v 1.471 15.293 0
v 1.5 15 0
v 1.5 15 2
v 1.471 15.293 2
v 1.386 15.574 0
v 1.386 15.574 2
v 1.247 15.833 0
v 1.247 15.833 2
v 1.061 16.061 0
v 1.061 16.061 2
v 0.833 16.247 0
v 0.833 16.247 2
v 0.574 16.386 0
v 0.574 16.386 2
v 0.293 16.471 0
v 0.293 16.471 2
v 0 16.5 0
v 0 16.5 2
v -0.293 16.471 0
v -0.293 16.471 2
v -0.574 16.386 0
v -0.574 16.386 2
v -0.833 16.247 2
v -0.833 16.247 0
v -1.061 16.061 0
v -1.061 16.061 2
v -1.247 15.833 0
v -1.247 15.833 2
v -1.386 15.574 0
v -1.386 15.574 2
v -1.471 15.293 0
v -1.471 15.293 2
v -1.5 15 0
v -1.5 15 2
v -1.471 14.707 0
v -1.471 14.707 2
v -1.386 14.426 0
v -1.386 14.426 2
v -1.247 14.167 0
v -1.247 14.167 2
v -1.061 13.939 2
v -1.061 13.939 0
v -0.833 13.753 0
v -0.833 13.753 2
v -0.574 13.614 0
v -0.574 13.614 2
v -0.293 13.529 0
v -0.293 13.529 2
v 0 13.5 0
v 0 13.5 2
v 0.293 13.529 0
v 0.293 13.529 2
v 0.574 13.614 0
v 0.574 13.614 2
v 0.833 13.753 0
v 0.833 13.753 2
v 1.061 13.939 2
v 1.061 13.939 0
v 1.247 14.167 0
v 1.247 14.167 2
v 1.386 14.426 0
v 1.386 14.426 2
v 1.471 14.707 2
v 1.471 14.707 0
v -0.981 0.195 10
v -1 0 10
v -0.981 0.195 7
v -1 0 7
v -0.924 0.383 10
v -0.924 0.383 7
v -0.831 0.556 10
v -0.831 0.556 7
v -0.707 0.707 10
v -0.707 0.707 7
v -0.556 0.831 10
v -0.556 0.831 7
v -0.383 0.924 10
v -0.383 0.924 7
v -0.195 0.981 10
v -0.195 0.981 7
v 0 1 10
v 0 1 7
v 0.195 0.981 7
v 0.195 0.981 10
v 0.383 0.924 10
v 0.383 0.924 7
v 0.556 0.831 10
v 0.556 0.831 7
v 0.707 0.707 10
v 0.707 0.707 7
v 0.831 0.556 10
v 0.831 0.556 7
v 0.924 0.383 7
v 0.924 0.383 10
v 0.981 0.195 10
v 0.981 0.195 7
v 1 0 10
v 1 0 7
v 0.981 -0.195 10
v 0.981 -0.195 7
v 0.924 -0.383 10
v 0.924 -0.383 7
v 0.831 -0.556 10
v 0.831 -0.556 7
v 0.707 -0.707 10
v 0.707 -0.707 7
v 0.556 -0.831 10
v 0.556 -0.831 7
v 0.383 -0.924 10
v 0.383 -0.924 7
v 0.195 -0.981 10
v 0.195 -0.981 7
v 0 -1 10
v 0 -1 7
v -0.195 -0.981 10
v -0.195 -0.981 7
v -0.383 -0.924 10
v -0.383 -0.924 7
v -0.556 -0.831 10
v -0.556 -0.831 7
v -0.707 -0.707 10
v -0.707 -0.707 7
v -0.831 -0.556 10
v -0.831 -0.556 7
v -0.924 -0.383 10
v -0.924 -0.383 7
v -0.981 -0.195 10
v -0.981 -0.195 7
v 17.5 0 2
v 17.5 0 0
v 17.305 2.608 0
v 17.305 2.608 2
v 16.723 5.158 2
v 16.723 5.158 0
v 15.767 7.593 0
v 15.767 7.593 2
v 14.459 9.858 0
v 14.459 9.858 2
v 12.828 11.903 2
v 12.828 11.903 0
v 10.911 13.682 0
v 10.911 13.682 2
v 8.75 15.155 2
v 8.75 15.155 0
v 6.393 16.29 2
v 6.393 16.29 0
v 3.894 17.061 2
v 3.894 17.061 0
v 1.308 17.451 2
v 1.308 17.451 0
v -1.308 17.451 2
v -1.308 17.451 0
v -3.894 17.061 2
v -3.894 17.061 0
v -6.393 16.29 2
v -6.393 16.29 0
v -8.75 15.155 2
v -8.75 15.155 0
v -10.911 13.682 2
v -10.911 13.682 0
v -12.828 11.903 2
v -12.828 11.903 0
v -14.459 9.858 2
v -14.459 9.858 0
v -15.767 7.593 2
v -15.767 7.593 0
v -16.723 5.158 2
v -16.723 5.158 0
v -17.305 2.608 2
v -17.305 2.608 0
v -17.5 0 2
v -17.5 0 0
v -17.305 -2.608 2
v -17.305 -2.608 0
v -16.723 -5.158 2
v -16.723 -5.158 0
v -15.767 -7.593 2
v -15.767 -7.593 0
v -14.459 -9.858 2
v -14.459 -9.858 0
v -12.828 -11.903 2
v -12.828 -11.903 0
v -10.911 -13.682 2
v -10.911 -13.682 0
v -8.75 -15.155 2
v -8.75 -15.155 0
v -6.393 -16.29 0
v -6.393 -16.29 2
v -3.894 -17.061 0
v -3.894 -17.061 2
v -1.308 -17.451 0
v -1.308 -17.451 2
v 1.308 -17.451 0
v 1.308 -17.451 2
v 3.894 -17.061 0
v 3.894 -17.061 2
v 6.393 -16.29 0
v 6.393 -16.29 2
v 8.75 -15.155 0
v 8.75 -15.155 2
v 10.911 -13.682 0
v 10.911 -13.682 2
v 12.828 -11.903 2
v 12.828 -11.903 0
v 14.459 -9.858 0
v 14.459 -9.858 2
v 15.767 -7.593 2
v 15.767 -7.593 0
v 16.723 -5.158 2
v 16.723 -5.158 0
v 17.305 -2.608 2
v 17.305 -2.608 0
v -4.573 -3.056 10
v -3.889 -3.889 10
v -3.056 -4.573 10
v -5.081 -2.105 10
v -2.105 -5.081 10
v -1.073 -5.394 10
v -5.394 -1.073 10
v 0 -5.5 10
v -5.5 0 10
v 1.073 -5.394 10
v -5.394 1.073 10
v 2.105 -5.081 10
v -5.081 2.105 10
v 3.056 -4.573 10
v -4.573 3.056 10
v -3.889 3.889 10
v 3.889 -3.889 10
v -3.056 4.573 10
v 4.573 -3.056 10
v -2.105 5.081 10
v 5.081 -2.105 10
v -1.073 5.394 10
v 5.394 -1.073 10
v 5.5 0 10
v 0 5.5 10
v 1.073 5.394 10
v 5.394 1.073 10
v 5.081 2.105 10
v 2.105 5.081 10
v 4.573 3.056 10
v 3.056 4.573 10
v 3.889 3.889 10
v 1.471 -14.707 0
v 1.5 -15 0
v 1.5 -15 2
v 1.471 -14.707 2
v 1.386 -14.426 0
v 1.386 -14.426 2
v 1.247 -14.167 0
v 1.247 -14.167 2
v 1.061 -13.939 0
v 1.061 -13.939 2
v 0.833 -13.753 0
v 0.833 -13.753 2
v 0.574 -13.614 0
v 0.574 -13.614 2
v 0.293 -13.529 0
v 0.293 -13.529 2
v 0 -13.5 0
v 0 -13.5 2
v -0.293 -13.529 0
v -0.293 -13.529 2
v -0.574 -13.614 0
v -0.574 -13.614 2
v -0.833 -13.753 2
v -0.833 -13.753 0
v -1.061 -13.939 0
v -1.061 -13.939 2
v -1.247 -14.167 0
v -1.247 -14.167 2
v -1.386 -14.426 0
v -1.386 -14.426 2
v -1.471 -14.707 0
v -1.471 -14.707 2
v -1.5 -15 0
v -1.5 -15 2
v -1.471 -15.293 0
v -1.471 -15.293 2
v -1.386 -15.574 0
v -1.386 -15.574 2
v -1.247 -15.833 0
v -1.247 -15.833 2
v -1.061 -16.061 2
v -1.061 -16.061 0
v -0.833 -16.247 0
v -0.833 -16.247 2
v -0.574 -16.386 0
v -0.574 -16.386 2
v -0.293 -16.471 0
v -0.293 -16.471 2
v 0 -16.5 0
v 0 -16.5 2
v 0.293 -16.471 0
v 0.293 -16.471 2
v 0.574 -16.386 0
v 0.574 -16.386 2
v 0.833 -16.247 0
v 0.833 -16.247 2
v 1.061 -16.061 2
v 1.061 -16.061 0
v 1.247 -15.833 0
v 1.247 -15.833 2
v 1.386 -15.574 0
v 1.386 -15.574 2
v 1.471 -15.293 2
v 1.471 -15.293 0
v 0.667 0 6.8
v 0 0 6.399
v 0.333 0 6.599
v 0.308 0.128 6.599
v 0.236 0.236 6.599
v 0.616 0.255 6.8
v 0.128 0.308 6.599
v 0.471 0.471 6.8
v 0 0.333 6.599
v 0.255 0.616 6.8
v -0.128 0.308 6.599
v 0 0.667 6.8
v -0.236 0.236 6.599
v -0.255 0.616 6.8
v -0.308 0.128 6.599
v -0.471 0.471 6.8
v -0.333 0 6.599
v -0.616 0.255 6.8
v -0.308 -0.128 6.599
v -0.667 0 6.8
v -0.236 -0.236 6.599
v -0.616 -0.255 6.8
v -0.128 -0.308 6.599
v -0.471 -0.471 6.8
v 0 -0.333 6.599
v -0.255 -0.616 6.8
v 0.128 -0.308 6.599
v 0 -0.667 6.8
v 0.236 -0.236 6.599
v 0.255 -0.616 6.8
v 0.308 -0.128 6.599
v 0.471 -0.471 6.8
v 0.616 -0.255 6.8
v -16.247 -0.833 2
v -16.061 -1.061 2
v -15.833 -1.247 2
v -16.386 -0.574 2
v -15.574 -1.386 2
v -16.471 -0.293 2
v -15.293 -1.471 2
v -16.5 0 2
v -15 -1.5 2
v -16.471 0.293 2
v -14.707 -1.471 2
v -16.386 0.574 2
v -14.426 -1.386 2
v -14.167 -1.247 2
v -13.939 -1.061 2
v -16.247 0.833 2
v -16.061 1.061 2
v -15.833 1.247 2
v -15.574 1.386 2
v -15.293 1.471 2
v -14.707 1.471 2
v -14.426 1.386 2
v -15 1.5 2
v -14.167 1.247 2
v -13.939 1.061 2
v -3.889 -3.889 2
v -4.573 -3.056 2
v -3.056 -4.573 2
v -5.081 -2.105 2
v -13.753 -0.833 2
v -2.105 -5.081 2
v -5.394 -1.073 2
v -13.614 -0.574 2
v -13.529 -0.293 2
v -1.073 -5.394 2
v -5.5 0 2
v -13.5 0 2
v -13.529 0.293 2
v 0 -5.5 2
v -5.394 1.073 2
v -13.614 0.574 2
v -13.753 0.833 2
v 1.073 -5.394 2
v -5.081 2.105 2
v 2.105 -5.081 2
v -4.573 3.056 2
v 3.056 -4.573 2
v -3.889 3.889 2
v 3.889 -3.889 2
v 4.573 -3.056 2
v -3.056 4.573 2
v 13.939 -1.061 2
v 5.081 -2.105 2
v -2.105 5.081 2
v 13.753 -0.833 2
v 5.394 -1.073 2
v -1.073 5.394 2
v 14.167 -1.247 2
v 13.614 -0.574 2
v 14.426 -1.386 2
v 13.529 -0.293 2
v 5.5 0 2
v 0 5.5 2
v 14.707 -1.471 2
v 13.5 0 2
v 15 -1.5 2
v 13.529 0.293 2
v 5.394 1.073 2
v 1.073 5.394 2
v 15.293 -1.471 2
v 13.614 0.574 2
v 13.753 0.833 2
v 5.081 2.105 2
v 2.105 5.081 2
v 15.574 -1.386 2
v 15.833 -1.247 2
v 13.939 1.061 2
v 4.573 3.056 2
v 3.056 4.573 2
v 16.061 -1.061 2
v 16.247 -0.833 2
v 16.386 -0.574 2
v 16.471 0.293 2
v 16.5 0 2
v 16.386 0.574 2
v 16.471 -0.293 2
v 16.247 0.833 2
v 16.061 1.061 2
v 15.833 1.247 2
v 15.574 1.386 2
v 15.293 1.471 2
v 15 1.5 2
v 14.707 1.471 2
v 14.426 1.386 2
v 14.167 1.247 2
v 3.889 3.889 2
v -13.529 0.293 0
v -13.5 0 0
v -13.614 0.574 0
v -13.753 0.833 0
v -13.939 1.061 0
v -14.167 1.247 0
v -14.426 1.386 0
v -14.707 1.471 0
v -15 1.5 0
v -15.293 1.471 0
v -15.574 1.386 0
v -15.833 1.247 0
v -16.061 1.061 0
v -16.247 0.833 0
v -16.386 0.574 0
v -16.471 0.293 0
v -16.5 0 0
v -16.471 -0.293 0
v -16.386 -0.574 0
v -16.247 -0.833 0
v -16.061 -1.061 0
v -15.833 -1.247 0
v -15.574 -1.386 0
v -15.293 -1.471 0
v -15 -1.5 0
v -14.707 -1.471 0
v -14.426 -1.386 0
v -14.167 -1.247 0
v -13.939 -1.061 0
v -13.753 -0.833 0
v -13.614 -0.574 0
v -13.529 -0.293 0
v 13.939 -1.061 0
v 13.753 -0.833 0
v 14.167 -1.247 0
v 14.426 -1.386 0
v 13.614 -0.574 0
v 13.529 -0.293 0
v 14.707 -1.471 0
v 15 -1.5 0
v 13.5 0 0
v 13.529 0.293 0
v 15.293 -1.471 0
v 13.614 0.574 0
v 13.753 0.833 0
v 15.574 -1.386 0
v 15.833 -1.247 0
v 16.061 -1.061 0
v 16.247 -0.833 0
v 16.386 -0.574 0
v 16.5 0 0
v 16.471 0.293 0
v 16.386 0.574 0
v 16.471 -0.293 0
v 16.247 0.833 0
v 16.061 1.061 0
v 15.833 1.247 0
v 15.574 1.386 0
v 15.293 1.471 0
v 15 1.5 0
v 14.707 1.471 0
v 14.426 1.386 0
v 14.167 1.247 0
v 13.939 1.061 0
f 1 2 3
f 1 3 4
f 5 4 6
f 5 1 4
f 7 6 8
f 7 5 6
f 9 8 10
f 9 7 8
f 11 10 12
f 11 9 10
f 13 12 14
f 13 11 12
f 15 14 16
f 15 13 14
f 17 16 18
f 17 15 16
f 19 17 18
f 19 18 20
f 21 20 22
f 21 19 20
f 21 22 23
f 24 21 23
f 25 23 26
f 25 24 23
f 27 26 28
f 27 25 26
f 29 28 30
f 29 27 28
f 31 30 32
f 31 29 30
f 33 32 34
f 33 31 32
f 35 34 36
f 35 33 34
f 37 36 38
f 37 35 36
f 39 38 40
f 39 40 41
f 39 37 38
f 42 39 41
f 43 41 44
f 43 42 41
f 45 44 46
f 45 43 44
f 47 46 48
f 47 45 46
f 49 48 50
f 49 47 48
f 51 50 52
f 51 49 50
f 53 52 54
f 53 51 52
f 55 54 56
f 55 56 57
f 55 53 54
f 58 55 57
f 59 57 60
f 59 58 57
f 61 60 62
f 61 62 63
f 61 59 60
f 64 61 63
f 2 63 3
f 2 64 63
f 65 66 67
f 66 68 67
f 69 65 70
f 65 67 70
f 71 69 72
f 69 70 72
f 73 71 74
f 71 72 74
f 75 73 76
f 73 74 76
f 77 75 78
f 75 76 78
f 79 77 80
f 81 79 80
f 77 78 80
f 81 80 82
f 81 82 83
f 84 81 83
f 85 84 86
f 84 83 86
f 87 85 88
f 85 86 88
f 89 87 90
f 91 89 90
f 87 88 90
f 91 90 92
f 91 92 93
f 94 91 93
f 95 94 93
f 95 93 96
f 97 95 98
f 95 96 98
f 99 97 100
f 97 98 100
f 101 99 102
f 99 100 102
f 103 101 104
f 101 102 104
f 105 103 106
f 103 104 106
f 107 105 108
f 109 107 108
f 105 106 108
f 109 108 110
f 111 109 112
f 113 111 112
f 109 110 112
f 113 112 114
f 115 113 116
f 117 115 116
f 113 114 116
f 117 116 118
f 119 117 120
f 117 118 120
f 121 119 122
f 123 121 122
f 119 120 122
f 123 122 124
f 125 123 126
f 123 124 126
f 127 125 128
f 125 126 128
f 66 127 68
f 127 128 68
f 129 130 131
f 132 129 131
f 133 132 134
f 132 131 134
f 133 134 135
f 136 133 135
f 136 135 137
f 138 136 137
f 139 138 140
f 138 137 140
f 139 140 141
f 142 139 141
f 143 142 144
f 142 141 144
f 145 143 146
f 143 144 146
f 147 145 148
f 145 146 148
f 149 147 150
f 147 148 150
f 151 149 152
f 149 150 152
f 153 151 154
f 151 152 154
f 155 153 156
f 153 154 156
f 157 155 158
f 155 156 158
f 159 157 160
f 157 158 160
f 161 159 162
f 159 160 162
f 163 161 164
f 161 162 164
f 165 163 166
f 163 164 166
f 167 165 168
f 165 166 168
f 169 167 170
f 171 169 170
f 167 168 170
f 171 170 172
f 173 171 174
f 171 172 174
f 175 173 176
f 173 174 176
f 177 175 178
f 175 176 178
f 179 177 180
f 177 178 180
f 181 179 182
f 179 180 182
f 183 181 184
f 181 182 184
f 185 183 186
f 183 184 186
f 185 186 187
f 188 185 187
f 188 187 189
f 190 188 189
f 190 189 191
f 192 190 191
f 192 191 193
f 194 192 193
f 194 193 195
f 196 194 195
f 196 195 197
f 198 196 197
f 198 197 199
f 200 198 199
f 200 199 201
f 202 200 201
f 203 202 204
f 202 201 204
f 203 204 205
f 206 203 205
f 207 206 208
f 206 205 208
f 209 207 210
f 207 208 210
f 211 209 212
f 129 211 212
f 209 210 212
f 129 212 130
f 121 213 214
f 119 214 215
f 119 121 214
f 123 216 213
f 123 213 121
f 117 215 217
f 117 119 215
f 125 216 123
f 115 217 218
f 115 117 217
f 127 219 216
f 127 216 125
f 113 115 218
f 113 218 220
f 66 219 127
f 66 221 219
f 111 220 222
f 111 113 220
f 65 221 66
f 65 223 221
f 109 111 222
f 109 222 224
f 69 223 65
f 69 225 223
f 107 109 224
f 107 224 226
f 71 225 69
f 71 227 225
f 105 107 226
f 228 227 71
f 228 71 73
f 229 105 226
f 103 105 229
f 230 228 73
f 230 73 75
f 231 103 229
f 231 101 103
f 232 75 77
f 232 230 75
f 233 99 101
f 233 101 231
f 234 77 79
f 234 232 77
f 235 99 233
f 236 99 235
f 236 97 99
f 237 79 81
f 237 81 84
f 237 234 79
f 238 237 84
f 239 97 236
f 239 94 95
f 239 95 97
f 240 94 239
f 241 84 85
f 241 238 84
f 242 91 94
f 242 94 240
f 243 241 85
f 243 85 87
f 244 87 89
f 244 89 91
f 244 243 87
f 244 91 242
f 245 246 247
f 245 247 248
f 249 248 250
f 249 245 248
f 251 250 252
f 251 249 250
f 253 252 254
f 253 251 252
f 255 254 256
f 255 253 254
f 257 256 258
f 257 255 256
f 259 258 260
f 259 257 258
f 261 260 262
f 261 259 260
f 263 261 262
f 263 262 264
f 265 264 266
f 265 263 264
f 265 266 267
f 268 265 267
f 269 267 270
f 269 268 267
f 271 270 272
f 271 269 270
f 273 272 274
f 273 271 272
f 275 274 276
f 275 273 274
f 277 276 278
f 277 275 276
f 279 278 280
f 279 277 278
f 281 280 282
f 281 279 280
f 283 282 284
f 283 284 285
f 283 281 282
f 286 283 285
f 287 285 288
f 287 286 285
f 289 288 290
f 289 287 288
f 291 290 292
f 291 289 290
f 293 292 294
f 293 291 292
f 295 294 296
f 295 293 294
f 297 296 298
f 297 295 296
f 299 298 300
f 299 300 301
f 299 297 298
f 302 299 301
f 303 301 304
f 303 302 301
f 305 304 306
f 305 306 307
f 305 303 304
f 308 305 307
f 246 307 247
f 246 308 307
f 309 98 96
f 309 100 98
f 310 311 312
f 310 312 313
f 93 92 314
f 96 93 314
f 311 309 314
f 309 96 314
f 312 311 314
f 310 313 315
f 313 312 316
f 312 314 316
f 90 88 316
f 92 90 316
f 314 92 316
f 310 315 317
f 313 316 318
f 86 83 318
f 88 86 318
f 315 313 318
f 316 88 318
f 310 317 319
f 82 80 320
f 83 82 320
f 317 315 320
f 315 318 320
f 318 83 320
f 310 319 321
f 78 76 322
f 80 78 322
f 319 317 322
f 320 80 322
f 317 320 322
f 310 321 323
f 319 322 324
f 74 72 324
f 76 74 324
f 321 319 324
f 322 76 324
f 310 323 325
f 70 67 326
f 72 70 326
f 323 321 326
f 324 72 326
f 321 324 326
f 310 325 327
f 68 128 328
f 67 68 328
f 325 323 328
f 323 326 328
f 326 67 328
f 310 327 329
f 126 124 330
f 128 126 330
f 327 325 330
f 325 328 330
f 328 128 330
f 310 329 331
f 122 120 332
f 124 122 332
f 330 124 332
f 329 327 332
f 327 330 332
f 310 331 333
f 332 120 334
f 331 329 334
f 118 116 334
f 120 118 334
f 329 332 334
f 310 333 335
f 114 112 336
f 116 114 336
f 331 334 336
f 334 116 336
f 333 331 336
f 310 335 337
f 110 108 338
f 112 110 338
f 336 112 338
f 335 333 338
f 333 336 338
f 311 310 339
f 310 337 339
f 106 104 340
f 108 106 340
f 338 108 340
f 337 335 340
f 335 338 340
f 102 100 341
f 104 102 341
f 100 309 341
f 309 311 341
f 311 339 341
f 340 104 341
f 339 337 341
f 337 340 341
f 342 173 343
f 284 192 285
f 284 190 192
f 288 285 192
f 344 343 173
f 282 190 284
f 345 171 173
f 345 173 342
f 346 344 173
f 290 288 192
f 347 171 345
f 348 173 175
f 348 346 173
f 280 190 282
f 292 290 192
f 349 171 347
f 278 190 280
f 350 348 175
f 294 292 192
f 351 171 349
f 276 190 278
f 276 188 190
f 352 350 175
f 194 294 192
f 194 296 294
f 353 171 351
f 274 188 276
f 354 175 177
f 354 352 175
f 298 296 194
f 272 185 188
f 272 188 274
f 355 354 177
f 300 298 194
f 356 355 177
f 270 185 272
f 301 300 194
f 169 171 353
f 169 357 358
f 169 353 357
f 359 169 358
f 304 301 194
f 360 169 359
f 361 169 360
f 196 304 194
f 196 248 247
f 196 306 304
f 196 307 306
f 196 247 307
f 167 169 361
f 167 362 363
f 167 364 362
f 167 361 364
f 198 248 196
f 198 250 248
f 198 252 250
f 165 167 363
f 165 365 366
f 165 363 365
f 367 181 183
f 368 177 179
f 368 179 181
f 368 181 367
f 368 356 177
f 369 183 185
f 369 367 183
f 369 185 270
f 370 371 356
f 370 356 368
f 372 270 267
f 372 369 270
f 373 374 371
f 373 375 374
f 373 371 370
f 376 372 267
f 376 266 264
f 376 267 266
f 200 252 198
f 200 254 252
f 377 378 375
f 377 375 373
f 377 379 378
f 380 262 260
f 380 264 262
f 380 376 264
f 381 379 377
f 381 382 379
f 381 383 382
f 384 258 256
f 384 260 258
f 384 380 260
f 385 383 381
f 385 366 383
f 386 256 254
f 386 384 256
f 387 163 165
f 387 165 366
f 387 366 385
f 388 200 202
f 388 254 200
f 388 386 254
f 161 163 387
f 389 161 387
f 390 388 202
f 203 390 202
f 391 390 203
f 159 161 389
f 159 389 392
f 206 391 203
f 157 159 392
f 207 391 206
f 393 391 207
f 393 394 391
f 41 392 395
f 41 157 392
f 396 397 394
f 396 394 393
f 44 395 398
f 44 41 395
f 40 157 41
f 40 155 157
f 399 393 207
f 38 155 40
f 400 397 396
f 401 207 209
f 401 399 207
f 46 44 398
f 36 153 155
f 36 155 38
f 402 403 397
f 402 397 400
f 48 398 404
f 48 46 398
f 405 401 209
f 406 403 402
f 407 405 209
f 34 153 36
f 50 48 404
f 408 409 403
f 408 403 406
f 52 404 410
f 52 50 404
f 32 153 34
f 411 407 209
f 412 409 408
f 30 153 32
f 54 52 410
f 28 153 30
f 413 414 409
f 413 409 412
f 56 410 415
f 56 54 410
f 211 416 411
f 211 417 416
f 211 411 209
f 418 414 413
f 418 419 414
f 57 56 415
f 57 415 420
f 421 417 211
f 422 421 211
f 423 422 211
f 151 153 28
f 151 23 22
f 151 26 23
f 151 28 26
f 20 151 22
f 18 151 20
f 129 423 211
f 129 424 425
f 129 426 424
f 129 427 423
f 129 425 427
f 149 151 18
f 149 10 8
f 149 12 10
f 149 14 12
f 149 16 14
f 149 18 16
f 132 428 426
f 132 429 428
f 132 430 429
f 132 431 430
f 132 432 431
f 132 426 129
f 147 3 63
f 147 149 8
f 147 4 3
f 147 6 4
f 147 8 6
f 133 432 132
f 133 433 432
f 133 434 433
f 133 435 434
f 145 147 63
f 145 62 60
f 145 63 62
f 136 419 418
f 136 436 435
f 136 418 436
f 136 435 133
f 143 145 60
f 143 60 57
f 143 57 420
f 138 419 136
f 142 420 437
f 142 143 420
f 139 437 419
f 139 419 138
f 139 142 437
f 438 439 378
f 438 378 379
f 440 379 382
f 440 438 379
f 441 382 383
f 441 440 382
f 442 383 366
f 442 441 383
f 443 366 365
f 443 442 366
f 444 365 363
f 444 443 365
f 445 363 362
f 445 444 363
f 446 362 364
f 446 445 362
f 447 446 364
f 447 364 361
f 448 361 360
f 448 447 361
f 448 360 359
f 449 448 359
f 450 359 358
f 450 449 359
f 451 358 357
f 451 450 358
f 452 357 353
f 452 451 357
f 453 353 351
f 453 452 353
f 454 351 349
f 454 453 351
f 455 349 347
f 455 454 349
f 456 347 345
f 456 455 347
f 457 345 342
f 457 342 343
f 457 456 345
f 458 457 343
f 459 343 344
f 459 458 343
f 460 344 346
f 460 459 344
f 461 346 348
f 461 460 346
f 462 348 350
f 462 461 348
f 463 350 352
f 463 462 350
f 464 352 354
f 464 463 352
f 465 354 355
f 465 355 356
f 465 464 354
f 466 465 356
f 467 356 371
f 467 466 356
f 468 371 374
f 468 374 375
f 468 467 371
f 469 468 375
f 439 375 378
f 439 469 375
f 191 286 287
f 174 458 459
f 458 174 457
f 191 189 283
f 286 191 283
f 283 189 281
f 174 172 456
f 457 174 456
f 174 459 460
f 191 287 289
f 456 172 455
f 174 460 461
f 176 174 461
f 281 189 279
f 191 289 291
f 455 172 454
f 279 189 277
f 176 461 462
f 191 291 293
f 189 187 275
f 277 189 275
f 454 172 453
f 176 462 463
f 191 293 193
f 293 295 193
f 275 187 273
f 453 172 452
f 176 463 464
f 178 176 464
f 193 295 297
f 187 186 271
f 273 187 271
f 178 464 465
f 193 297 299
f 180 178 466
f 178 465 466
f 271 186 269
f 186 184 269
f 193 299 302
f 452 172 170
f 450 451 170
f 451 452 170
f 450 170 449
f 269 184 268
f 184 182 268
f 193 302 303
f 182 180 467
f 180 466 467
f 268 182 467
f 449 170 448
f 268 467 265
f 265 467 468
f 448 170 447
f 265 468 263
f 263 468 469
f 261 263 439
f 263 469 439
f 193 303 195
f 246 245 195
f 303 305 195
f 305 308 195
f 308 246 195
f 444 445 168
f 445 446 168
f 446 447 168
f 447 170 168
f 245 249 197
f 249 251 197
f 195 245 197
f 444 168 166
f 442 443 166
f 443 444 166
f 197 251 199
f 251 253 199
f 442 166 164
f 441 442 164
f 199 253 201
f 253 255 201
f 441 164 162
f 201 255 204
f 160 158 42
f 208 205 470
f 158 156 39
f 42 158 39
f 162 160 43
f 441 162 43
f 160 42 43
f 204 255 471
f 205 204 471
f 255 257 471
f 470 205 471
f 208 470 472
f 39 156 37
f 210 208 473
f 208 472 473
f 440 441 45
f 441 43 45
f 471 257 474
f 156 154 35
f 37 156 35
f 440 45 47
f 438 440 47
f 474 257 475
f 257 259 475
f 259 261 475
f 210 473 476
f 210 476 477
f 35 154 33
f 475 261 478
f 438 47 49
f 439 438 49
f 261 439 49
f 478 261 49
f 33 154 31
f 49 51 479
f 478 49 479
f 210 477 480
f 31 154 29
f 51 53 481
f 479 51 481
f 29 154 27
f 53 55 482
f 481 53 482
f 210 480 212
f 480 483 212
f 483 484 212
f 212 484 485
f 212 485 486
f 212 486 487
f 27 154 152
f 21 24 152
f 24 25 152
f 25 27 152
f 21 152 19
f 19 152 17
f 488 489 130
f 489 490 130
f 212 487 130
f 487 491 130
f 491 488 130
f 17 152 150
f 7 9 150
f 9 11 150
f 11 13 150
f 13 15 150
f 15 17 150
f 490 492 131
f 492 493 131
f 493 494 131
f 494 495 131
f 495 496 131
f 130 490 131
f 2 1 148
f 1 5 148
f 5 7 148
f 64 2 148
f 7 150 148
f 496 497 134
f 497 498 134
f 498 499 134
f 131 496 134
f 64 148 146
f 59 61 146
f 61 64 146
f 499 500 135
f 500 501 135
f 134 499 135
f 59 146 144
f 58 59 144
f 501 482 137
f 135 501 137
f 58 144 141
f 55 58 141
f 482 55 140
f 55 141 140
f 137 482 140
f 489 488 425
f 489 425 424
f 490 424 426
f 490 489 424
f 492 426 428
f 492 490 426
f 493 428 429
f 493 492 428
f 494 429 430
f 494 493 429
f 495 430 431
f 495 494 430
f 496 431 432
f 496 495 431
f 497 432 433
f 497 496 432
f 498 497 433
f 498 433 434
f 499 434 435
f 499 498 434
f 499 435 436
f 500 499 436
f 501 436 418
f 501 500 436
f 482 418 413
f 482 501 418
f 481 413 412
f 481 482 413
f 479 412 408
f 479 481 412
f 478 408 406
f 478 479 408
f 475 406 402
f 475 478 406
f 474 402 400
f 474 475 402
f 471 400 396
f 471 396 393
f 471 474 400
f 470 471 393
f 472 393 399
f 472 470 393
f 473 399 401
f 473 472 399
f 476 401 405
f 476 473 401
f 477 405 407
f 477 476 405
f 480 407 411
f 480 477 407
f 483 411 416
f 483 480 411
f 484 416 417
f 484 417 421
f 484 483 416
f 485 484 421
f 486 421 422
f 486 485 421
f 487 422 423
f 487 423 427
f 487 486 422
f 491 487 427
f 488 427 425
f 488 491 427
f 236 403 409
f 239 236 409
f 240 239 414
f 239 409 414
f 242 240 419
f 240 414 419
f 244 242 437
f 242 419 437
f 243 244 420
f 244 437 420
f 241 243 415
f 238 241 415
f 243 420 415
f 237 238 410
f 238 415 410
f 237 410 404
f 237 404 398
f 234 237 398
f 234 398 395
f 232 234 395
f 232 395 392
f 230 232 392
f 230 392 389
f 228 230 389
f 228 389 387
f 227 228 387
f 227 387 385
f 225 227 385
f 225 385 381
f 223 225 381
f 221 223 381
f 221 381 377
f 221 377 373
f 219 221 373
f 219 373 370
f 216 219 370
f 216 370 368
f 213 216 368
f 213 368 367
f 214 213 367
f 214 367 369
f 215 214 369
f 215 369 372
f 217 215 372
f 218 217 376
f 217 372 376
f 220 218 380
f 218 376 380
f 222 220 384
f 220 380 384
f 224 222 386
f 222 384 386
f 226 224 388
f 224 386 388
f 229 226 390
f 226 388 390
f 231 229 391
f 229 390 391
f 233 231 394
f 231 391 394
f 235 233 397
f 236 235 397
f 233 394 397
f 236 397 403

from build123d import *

# Parameters (mm, degrees)
SKETCH1_R                       = 17.5
SKETCH1_R_2                     = 1.5
SKETCH1_R_3                     = 5.5
BOSS_EXTRUDE1_DEPTH             = 2
SKETCH1_8_R                     = 5.5
BOSS_EXTRUDE3_DEPTH             = 10
TAP_DRILL_FOR_M2X0_4_TAP1_D     = 2
TAP_DRILL_FOR_M2X0_4_TAP1_DEPTH = 3
TAP_DRILL_FOR_M2X0_4_TAP1_TIP   = 0.600860619


with BuildPart() as part:
    # Sketch1 → Boss-Extrude1 (new body)
    with BuildSketch(Plane.XY):
        Circle(SKETCH1_R)
        with Locations((0, -15)):
            Circle(SKETCH1_R_2, mode=Mode.SUBTRACT)
        with Locations((-15, 0)):
            Circle(SKETCH1_R_2, mode=Mode.SUBTRACT)
        Circle(SKETCH1_R_3, mode=Mode.SUBTRACT)
        with Locations((15, 0)):
            Circle(SKETCH1_R_2, mode=Mode.SUBTRACT)
        with Locations((0, 15)):
            Circle(SKETCH1_R_2, mode=Mode.SUBTRACT)
    extrude(amount=BOSS_EXTRUDE1_DEPTH)

    # Sketch1<8> → Boss-Extrude3 (add)
    with BuildSketch(Plane.XY):
        Circle(SKETCH1_8_R)
    extrude(amount=BOSS_EXTRUDE3_DEPTH)

    # Tap Drill for M2x0.4 Tap1
    with Locations(Plane.XY.offset(10)):
        with Locations((0, 0)):
            Hole(TAP_DRILL_FOR_M2X0_4_TAP1_D / 2, depth=TAP_DRILL_FOR_M2X0_4_TAP1_DEPTH)
            with Locations((0, 0, -(TAP_DRILL_FOR_M2X0_4_TAP1_DEPTH + TAP_DRILL_FOR_M2X0_4_TAP1_TIP / 2))):  # 118° drill point
                Cone(0, TAP_DRILL_FOR_M2X0_4_TAP1_D / 2, TAP_DRILL_FOR_M2X0_4_TAP1_TIP, mode=Mode.SUBTRACT)


solid = part.part
